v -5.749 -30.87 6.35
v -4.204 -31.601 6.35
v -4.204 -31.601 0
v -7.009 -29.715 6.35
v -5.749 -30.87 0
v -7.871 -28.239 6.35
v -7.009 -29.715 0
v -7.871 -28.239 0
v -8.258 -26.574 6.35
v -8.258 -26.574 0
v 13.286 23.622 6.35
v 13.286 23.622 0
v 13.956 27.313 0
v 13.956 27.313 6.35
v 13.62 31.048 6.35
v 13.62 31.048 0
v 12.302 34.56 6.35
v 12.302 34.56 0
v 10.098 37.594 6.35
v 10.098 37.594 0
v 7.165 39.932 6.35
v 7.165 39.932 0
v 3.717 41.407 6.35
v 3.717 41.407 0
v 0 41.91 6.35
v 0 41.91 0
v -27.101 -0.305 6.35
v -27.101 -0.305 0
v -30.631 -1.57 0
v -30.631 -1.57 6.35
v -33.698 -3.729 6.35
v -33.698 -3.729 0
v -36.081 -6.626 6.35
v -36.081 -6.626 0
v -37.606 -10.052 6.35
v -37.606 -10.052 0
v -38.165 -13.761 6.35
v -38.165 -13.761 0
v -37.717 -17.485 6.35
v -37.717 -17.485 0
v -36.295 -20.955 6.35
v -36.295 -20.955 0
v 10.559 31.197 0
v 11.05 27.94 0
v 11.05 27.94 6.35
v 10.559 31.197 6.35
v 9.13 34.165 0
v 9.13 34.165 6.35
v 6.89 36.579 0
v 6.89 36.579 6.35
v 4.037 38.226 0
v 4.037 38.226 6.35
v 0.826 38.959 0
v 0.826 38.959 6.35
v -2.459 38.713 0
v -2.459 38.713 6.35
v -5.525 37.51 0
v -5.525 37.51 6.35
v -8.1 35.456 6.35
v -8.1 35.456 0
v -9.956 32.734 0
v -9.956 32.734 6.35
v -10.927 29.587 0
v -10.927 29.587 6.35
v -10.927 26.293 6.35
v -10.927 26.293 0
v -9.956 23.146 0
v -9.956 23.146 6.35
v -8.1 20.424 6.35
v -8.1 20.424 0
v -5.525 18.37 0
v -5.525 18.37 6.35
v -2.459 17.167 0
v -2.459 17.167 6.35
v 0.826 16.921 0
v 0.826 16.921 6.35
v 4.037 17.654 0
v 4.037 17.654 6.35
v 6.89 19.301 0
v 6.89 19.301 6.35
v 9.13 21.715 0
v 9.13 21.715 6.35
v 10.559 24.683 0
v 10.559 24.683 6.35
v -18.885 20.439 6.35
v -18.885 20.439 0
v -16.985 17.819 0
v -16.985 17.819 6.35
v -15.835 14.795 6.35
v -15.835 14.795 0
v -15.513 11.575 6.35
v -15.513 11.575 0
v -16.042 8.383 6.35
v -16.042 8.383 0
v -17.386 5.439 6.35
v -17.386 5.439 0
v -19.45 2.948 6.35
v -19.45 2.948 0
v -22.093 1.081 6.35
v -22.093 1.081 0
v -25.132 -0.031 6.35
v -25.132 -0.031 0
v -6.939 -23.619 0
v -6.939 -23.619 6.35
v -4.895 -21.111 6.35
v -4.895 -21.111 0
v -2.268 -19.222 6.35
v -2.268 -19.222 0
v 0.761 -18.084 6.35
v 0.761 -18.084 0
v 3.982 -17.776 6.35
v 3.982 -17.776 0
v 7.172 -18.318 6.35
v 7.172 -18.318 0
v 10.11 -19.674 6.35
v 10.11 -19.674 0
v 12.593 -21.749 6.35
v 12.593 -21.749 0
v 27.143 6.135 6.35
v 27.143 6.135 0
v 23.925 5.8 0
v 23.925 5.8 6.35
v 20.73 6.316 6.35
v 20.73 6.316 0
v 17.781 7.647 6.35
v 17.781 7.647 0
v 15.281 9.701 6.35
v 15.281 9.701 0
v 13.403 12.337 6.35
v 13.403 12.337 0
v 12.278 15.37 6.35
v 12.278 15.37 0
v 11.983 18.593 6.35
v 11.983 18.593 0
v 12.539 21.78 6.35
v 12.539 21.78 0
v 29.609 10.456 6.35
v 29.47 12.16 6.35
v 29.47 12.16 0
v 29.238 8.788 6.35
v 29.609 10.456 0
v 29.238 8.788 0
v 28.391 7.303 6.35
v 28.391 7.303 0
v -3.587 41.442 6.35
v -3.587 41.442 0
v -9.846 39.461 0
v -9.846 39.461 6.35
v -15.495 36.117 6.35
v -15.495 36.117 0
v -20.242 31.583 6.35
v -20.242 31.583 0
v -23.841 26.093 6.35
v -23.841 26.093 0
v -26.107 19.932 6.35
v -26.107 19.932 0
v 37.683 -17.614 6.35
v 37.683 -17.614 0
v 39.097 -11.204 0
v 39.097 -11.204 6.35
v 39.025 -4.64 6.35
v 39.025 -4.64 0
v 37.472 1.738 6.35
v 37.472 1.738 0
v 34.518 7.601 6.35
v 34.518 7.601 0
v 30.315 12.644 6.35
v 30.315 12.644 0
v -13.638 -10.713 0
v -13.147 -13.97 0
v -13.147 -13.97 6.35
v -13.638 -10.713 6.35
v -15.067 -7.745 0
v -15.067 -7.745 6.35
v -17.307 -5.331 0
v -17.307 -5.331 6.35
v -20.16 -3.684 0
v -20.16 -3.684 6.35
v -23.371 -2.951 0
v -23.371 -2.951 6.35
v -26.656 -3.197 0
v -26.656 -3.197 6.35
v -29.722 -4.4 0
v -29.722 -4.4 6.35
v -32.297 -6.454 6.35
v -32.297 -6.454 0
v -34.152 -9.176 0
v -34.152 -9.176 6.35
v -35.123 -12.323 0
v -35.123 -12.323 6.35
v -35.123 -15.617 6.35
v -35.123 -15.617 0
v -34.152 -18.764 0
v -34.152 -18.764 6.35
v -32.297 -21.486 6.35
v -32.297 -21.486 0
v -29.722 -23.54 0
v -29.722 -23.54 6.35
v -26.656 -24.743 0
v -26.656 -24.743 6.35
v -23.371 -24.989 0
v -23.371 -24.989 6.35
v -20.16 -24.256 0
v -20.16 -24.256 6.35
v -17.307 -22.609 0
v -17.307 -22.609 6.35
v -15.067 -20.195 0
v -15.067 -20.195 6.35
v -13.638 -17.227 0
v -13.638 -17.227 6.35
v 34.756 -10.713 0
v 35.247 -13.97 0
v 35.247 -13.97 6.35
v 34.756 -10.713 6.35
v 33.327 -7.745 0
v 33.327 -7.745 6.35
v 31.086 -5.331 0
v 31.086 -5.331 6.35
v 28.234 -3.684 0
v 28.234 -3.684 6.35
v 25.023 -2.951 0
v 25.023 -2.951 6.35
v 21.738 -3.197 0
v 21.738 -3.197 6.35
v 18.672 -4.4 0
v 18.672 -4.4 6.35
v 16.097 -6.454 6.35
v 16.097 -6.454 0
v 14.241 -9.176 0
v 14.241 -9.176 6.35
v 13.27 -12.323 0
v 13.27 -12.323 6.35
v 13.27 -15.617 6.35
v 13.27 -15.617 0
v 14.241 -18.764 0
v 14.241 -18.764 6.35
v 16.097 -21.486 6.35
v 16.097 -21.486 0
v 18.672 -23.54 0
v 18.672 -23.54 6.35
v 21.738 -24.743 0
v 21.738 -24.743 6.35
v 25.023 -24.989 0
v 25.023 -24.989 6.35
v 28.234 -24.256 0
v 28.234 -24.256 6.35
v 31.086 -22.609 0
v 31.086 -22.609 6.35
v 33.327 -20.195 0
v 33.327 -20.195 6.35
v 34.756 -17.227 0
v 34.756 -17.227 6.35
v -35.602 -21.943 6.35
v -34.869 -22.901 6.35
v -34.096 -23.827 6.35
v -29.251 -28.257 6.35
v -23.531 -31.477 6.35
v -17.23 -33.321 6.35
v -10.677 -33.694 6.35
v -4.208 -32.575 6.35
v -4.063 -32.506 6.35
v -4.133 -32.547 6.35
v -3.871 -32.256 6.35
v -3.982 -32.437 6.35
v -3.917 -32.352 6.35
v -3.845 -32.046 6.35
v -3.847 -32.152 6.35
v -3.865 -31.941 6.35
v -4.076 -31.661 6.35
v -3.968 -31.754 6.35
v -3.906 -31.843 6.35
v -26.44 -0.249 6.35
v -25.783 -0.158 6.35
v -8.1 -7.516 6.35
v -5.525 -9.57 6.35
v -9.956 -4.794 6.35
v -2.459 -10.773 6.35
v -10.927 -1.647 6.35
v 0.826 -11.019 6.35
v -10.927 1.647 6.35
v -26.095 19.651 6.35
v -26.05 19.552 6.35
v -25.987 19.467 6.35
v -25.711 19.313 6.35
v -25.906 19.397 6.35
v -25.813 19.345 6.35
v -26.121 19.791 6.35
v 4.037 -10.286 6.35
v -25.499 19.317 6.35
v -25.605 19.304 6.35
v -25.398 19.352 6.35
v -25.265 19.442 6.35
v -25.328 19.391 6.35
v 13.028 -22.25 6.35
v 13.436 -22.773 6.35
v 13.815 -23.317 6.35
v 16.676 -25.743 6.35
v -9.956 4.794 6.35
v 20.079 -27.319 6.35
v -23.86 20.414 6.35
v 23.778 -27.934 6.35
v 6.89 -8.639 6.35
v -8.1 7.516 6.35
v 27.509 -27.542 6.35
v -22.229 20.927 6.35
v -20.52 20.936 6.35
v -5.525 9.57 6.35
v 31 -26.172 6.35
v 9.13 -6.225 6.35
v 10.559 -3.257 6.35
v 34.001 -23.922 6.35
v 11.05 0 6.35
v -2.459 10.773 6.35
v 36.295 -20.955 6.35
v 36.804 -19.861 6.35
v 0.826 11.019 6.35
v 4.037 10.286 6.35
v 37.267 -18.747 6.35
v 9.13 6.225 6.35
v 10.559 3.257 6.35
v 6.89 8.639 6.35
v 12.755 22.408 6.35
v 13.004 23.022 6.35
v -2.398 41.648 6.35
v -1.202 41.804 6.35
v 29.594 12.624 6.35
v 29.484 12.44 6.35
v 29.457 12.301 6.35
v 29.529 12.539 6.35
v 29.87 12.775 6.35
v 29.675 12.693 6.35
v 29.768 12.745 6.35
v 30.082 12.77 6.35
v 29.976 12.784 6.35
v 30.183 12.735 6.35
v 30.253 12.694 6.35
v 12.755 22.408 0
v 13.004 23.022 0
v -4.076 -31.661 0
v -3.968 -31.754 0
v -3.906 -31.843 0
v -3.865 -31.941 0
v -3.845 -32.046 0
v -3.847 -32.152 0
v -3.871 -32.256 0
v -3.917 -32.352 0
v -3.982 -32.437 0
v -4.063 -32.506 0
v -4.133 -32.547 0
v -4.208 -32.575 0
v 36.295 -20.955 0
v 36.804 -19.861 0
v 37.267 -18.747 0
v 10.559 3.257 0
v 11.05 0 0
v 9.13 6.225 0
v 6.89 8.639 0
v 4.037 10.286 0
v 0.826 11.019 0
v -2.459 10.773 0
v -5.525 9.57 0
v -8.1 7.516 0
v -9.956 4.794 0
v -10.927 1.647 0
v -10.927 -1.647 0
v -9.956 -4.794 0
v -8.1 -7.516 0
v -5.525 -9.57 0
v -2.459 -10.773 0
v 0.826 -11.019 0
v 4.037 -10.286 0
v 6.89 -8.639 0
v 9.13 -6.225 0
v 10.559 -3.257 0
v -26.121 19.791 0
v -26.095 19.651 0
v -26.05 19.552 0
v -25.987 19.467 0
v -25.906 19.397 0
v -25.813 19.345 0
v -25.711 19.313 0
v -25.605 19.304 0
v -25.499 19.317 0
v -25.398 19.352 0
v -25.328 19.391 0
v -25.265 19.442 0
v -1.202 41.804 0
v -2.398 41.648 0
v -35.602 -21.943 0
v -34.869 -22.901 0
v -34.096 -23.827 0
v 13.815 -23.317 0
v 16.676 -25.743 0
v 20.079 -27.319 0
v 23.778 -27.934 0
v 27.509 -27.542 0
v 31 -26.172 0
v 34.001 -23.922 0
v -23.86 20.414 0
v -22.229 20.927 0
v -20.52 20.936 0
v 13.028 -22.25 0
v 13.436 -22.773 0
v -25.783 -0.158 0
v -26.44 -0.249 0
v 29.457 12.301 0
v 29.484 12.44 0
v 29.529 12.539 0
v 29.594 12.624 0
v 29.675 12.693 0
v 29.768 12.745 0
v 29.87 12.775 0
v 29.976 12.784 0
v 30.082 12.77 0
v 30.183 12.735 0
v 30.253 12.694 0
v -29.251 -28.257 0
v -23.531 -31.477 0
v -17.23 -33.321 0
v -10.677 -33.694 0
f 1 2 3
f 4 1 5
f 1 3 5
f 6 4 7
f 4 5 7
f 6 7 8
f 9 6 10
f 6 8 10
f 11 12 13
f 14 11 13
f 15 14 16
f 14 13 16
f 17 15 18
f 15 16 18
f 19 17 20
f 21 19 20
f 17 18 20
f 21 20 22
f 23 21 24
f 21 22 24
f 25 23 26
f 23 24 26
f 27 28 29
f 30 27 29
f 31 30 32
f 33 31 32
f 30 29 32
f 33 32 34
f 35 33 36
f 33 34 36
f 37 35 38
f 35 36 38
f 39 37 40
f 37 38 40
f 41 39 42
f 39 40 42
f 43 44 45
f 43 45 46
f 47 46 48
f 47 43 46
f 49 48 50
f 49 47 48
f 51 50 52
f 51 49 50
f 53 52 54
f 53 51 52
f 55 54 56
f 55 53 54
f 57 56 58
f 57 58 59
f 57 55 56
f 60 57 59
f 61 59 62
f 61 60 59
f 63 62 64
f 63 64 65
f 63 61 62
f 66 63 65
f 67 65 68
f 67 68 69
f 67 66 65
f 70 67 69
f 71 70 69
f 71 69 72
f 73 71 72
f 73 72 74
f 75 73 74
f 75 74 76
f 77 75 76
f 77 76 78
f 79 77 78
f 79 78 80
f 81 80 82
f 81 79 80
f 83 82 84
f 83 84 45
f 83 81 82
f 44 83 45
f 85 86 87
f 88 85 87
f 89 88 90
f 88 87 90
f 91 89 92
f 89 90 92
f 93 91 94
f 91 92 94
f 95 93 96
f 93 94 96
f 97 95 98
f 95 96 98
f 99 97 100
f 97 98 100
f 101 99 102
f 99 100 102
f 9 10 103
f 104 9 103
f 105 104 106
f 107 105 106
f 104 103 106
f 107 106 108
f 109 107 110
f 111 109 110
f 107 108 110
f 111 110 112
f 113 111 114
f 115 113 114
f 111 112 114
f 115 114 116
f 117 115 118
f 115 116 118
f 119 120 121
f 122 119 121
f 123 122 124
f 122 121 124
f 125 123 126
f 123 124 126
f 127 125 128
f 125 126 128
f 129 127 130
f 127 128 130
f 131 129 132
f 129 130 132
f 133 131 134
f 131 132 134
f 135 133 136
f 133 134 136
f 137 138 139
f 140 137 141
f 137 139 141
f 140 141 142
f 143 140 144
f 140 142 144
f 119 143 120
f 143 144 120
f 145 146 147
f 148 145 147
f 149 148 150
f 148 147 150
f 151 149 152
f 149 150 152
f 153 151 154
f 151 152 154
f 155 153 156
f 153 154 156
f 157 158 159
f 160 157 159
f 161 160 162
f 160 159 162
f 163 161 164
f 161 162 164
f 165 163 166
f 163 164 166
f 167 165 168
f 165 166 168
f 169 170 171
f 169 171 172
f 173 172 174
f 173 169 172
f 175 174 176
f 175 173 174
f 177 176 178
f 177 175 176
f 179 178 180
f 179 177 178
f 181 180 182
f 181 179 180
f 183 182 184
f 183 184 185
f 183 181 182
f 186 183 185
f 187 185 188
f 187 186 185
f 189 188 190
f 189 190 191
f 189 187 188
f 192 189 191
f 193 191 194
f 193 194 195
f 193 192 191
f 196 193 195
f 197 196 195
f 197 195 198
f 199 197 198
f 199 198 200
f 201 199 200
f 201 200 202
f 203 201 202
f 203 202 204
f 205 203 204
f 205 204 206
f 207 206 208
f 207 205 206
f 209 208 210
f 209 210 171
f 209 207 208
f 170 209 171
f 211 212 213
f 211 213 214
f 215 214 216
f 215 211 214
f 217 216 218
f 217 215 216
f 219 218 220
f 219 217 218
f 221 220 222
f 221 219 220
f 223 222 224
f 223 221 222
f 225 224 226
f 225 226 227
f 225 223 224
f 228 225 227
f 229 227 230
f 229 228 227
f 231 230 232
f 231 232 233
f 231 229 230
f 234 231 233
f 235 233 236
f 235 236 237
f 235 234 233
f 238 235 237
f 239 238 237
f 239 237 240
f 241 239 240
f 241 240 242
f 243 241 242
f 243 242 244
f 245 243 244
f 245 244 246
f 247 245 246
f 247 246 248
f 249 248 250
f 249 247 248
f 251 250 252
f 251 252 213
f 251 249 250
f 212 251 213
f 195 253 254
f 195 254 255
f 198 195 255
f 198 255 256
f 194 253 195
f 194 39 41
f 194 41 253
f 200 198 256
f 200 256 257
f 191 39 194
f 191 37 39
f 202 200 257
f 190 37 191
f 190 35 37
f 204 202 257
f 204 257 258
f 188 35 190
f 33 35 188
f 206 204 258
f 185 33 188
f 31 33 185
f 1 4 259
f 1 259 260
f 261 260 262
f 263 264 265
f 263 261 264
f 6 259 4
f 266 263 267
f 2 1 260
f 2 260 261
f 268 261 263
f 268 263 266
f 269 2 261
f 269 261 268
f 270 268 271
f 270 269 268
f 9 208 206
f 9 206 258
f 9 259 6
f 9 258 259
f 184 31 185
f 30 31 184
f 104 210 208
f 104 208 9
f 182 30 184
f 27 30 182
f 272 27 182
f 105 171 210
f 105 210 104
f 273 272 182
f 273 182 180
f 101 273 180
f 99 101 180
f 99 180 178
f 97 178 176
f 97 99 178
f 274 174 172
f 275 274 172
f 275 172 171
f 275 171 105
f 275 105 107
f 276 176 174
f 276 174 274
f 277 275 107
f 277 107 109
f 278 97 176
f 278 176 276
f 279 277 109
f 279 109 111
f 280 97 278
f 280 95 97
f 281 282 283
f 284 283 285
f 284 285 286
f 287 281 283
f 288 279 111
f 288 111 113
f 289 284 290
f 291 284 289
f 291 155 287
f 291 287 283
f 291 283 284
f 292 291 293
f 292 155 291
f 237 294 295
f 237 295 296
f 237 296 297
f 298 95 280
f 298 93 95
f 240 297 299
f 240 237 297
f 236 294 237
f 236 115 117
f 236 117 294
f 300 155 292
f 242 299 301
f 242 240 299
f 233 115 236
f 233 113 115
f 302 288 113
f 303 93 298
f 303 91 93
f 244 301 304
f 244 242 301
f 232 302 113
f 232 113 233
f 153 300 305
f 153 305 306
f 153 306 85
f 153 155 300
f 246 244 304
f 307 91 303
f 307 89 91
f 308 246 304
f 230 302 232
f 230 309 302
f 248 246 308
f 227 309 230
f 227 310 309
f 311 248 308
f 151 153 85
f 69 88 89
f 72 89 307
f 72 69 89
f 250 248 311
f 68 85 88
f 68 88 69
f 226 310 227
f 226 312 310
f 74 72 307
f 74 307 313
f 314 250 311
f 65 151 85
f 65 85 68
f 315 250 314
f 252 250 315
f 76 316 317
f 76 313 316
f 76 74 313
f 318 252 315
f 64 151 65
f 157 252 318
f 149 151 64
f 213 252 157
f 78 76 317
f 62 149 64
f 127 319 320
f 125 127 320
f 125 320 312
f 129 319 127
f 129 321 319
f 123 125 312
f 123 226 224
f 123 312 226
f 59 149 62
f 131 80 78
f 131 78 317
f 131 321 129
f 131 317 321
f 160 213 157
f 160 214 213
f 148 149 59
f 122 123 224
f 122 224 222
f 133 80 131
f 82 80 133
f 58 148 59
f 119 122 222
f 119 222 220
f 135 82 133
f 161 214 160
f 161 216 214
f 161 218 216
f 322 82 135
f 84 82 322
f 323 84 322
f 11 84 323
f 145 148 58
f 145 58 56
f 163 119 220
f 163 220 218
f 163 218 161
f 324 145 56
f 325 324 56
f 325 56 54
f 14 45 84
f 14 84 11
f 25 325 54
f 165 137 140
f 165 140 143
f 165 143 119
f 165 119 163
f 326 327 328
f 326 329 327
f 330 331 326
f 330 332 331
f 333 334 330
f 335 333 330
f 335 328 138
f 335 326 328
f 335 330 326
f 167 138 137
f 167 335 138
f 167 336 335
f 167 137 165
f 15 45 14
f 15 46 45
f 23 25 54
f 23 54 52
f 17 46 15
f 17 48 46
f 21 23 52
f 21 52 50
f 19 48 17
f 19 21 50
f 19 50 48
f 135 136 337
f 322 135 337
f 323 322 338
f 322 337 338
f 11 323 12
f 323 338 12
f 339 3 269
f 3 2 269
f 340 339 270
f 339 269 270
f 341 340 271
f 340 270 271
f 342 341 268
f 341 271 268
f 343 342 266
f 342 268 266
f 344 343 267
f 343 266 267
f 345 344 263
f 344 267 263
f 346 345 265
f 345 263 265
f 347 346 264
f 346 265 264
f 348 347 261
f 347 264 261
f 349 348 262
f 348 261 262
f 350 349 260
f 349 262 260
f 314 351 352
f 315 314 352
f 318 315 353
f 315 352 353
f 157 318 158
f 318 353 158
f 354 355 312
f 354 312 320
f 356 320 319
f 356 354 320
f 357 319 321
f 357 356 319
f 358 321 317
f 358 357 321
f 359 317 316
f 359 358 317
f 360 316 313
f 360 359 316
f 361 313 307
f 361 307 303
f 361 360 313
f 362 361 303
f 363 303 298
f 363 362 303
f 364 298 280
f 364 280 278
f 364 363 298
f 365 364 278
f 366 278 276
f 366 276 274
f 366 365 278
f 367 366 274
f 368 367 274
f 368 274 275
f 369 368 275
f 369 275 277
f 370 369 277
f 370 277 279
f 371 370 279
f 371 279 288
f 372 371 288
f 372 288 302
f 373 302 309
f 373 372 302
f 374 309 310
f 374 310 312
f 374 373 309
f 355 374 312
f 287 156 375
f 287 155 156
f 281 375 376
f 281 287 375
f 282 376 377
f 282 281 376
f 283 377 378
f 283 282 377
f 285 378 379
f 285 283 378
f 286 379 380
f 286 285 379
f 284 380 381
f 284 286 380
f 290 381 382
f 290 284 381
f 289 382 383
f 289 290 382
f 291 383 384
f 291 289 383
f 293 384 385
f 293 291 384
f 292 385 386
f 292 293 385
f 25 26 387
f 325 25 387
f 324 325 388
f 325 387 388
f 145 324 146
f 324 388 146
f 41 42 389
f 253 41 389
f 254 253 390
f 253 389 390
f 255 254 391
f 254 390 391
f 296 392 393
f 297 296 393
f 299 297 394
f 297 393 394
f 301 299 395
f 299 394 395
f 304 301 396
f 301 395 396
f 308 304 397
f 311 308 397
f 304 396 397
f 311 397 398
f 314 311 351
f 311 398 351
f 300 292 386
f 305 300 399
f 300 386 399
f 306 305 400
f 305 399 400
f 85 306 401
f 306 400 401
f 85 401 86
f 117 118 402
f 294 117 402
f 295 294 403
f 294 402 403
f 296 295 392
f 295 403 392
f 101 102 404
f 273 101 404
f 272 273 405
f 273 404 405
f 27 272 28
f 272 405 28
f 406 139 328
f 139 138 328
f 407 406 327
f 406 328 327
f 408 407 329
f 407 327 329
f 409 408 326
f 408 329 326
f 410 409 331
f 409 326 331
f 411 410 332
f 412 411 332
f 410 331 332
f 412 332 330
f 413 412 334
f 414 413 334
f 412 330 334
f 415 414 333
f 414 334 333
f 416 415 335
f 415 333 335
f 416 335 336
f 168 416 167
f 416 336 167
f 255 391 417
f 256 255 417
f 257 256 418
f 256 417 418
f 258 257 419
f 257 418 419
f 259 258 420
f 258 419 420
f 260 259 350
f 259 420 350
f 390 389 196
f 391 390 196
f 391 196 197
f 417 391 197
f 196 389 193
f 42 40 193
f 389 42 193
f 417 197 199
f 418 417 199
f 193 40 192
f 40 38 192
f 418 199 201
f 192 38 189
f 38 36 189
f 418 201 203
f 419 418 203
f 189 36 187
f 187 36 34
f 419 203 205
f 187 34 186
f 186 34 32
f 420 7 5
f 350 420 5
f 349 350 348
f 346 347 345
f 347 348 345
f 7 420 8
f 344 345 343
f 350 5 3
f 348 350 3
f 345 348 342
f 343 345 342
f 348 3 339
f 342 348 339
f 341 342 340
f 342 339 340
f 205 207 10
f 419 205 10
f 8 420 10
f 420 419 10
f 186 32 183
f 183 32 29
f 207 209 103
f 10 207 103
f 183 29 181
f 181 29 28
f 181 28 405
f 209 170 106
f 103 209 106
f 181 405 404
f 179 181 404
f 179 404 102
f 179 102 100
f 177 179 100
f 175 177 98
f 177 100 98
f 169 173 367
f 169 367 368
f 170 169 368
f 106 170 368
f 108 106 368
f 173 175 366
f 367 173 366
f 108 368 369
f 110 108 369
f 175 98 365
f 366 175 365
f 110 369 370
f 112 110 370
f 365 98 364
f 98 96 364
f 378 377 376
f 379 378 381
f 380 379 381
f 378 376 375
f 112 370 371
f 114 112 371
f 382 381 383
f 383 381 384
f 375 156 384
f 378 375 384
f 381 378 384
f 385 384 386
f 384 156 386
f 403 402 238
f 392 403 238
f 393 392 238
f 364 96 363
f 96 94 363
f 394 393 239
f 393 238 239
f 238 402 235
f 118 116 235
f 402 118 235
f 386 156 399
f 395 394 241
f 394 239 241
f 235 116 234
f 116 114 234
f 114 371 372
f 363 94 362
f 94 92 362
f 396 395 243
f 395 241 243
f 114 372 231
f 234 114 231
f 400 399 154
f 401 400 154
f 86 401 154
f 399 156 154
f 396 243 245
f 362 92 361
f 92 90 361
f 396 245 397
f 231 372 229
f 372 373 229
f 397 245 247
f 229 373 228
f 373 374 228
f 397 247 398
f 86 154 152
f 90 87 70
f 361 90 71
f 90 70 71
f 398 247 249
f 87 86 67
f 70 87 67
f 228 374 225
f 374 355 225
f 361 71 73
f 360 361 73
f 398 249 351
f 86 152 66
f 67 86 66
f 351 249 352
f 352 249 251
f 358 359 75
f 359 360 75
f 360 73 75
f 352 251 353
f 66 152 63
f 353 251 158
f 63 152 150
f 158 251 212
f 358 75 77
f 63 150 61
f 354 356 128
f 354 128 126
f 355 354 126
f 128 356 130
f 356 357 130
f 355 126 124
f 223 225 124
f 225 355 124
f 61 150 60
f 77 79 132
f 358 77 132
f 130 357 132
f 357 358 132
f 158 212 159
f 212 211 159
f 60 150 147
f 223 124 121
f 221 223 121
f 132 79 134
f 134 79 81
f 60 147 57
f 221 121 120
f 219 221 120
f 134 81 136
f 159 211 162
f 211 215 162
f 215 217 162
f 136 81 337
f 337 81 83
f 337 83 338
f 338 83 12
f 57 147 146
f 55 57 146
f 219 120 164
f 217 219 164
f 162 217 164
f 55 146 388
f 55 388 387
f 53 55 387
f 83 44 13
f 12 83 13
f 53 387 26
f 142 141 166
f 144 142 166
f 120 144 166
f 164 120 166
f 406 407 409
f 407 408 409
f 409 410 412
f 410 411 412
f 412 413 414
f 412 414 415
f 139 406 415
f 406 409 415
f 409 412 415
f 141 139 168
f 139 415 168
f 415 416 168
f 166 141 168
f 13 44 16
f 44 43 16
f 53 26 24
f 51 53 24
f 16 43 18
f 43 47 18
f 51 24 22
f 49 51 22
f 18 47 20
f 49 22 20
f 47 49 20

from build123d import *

# Parameters (mm, degrees)
F0_R     = 11.05
F1_DEPTH = 6.35
F2_R     = 0.508


# Not quite as in the source:
# - a feature names something its author has since deleted; it is built from what else it names


with BuildPart() as f1:
    # F0 (on Top) → F1 (new body)
    with BuildSketch(Plane.XY):
        with BuildLine():
            ThreePointArc((27.1429276567, 6.1352837814), (15.2810658667, 9.7013912391), (12.5387063316, 21.7803130331))
            ThreePointArc((12.5387063316, 21.7803130331), (12.8751071514, 22.7165186649), (13.2860771432, 23.6224712919))
            ThreePointArc((13.2860771432, 23.6224712919), (11.3021408603, 36.1511212373), (0, 41.91))
            ThreePointArc((0, 41.91), (-1.8008358417, 41.7320810261), (-3.5869805559, 41.4416469548))
            ThreePointArc((-3.5869805559, 41.4416469548), (-18.8414291839, 33.1449919843), (-26.5736300498, 17.5968166441))
            ThreePointArc((-26.5736300498, 17.5968166441), (-23.32919107, 20.6410473634), (-18.8847754424, 20.4388229931))
            ThreePointArc((-18.8847754424, 20.4388229931), (-16.0421841985, 8.3830956179), (-25.1316575548, -0.0313183028))
            ThreePointArc((-25.1316575548, -0.0313183028), (-26.1106358251, -0.2080894629), (-27.1006988106, -0.3051553233))
            ThreePointArc((-27.1006988106, -0.3051553233), (-36.958859797, -8.2876195165), (-36.2951246726, -20.955))
            ThreePointArc((-36.2951246726, -20.955), (-35.2406244005, -22.4256101), (-34.0960287596, -23.8272397617))
            ThreePointArc((-34.0960287596, -23.8272397617), (-19.2836904747, -32.889652309), (-1.9524752146, -31.811847016))
            ThreePointArc((-1.9524752146, -31.811847016), (-6.2110758425, -30.5241957981), (-8.2581522143, -26.5741067745))
            ThreePointArc((-8.2581522143, -26.5741067745), (0.7611183318, -18.0844868571), (12.5929512232, -21.7489947303))
            ThreePointArc((12.5929512232, -21.7489947303), (13.2355286736, -22.508429202), (13.8146216674, -23.3173159686))
            ThreePointArc((13.8146216674, -23.3173159686), (25.6567189367, -27.8635017208), (36.2951246726, -20.955))
            ThreePointArc((36.2951246726, -20.955), (37.0414602422, -19.3064709261), (37.6830093155, -17.6144071931))
            ThreePointArc((37.6830093155, -17.6144071931), (38.1251196586, -0.2553396753), (28.5261052644, 14.2150303719))
            ThreePointArc((28.5261052644, 14.2150303719), (29.5402669125, 9.8831484346), (27.1429276567, 6.1352837814))
        make_face()
        with Locations((-24.1967497817, -13.97)):
            Circle(F0_R, mode=Mode.SUBTRACT)
        Circle(F0_R, mode=Mode.SUBTRACT)
        with Locations((24.1967497817, -13.97)):
            Circle(F0_R, mode=Mode.SUBTRACT)
        with Locations((0, 27.94)):
            Circle(F0_R, mode=Mode.SUBTRACT)
    extrude(amount=F1_DEPTH)

    # F2
    f2_edges = [f1.edges().sort_by_distance(p)[0] for p in [
        (-1.952475, -31.811847, 3.175),
        (-26.57363, 17.596817, 3.175),
        (28.526105, 14.21503, 3.175),
    ]]
    fillet(f2_edges, radius=F2_R)


solid = f1.part
